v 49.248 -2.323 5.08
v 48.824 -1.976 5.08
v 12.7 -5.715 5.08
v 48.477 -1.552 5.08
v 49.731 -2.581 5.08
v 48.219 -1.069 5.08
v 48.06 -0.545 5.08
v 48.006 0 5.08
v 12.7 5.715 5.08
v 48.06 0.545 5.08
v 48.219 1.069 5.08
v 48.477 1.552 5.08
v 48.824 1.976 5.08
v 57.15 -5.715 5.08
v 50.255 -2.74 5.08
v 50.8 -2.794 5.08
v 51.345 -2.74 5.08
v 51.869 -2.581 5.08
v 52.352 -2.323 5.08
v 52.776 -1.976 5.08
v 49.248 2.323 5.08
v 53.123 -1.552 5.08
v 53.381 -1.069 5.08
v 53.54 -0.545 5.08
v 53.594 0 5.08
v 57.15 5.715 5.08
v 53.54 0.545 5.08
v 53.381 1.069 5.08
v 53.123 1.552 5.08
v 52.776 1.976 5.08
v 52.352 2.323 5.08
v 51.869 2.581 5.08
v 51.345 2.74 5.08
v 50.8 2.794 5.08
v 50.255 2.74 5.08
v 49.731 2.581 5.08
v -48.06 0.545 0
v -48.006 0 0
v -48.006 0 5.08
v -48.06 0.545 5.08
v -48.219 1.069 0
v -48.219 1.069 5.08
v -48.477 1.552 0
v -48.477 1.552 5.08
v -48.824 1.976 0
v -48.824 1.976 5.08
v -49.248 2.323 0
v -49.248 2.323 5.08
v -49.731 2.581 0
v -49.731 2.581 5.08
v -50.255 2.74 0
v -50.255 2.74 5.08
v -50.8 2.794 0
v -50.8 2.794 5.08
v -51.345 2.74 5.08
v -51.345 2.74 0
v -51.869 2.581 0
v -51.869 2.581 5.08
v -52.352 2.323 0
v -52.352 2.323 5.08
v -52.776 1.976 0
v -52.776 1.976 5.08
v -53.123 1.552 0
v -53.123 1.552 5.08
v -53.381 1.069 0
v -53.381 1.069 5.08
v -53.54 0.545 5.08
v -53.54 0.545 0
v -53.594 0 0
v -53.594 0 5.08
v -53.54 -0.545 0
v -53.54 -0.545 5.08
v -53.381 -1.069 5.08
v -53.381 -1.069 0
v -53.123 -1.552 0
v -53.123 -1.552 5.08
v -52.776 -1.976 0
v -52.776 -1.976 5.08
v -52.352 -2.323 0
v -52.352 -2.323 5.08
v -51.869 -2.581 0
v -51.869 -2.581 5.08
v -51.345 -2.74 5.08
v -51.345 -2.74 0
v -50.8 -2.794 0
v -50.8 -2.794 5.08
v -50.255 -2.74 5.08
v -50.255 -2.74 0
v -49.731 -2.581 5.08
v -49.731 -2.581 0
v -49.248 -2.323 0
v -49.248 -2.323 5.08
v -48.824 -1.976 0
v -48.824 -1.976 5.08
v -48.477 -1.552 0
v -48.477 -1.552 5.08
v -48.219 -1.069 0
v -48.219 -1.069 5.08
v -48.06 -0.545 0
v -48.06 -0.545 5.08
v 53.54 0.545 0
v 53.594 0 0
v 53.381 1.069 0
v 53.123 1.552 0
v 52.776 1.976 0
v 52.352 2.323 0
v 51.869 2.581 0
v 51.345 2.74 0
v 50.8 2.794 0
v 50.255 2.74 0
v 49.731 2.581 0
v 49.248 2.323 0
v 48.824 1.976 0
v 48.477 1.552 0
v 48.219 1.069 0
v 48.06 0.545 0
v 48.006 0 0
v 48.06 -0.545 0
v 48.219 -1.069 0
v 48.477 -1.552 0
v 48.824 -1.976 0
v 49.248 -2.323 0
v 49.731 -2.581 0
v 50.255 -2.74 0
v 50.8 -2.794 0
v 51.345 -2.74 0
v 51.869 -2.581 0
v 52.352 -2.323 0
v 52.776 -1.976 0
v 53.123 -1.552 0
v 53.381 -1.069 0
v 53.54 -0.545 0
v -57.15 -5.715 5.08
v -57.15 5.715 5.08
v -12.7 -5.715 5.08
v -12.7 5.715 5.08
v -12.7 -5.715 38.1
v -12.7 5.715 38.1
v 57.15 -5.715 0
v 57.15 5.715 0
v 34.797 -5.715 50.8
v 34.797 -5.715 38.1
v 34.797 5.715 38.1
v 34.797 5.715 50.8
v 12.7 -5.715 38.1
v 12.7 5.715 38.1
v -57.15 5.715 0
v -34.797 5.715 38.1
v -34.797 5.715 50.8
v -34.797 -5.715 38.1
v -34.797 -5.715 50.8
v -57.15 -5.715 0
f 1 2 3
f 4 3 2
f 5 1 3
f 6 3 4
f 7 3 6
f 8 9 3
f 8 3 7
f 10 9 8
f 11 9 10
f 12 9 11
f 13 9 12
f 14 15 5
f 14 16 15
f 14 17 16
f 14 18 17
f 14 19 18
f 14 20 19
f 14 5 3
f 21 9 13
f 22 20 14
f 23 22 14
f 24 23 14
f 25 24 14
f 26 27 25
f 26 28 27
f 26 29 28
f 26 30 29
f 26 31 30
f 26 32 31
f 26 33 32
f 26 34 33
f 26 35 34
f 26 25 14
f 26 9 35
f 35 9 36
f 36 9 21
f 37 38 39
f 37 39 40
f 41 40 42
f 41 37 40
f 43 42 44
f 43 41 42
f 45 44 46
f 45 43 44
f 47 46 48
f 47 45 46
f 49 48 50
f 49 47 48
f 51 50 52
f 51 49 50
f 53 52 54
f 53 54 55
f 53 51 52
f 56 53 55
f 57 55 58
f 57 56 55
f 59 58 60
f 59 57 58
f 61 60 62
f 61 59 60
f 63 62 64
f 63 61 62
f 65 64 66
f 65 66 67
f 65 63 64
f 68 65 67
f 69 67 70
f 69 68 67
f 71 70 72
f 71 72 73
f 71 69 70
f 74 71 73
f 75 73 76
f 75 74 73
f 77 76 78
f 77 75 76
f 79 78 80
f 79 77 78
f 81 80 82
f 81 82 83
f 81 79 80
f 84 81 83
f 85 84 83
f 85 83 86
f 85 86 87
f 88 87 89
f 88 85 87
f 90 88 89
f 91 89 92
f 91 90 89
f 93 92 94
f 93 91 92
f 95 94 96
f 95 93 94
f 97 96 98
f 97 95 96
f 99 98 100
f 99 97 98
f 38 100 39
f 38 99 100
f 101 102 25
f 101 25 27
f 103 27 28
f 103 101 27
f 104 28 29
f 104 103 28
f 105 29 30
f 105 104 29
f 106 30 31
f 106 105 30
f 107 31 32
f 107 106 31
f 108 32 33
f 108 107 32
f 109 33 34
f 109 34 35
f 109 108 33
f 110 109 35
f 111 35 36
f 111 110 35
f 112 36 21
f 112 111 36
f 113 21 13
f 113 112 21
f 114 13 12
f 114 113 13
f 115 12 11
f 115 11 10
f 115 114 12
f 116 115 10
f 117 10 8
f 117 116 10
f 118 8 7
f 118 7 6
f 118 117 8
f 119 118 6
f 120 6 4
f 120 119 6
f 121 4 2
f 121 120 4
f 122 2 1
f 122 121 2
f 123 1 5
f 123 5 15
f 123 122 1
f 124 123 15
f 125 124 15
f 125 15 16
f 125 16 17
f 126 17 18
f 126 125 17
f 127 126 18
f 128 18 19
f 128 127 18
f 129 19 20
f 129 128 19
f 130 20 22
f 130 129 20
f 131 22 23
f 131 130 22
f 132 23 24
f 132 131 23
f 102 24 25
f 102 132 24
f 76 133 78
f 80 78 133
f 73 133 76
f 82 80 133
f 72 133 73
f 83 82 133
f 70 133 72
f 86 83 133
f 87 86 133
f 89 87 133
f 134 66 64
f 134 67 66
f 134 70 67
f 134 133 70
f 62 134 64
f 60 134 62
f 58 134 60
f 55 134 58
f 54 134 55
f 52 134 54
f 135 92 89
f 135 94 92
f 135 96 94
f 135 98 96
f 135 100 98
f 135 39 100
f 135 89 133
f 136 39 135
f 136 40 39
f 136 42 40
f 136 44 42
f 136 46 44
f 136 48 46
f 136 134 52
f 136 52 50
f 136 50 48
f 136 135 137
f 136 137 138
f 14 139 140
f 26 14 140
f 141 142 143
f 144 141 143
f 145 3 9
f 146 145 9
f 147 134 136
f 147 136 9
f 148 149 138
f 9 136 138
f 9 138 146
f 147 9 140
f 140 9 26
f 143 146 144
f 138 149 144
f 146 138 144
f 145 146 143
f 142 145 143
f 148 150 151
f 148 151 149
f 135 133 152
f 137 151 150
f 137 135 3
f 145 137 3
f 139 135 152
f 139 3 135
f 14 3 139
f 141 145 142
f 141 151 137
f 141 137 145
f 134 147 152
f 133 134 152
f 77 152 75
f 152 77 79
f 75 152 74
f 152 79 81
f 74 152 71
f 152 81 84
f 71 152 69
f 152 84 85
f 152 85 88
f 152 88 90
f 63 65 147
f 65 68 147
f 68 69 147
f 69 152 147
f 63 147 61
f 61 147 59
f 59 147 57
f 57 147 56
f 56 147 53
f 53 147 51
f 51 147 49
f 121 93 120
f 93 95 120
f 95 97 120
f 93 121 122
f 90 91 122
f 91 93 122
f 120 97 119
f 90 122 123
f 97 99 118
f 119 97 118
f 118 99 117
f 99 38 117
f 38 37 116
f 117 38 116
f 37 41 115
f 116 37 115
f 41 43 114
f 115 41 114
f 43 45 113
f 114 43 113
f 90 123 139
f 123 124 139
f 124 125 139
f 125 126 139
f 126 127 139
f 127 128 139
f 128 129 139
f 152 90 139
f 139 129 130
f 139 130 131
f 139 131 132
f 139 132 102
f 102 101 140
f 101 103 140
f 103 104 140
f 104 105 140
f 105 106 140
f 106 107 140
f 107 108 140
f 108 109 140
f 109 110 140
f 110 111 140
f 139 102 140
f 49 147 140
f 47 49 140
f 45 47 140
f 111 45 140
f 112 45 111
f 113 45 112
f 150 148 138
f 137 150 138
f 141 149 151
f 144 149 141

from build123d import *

# Parameters (mm, degrees)
SKETCH1_R           = 2.794
BOSS_EXTRUDE1_DEPTH = 5.08
SKETCH3_W           = 25.4
SKETCH3_H           = 11.43
BOSS_EXTRUDE2_DEPTH = 45.72
SKETCH4_W           = 22.096687199
SKETCH4_H           = 11.43
BOSS_EXTRUDE3_DEPTH = 12.7


with BuildPart() as part:
    # Sketch1 → Boss-Extrude1 (new body)
    with BuildSketch(Plane.XY):
        Polygon((-57.15, 2.54), (-57.15, -2.54), (-57.15, -5.715), (57.15, -5.715), (57.15, -2.54), (57.15, 2.54), (57.15, 5.715), (-57.15, 5.715), align=None)
        with Locations((50.8, 0)):
            Circle(SKETCH1_R, mode=Mode.SUBTRACT)
        with Locations((-50.8, 0)):
            Circle(SKETCH1_R, mode=Mode.SUBTRACT)
    extrude(amount=BOSS_EXTRUDE1_DEPTH)

    # Sketch3 → Boss-Extrude2 (add)
    with BuildSketch(Plane.XY.offset(5.08)):
        Rectangle(SKETCH3_W, SKETCH3_H)
    extrude(amount=BOSS_EXTRUDE2_DEPTH)

    # Sketch4 → Boss-Extrude3 (add)
    with BuildSketch(Plane.XY.offset(50.8)):
        with Locations((23.7483436, 0)):
            Rectangle(SKETCH4_W, SKETCH4_H)
        with Locations((-23.7483436, 0)):
            Rectangle(SKETCH4_W, SKETCH4_H)
    extrude(amount=-BOSS_EXTRUDE3_DEPTH)


solid = part.part
